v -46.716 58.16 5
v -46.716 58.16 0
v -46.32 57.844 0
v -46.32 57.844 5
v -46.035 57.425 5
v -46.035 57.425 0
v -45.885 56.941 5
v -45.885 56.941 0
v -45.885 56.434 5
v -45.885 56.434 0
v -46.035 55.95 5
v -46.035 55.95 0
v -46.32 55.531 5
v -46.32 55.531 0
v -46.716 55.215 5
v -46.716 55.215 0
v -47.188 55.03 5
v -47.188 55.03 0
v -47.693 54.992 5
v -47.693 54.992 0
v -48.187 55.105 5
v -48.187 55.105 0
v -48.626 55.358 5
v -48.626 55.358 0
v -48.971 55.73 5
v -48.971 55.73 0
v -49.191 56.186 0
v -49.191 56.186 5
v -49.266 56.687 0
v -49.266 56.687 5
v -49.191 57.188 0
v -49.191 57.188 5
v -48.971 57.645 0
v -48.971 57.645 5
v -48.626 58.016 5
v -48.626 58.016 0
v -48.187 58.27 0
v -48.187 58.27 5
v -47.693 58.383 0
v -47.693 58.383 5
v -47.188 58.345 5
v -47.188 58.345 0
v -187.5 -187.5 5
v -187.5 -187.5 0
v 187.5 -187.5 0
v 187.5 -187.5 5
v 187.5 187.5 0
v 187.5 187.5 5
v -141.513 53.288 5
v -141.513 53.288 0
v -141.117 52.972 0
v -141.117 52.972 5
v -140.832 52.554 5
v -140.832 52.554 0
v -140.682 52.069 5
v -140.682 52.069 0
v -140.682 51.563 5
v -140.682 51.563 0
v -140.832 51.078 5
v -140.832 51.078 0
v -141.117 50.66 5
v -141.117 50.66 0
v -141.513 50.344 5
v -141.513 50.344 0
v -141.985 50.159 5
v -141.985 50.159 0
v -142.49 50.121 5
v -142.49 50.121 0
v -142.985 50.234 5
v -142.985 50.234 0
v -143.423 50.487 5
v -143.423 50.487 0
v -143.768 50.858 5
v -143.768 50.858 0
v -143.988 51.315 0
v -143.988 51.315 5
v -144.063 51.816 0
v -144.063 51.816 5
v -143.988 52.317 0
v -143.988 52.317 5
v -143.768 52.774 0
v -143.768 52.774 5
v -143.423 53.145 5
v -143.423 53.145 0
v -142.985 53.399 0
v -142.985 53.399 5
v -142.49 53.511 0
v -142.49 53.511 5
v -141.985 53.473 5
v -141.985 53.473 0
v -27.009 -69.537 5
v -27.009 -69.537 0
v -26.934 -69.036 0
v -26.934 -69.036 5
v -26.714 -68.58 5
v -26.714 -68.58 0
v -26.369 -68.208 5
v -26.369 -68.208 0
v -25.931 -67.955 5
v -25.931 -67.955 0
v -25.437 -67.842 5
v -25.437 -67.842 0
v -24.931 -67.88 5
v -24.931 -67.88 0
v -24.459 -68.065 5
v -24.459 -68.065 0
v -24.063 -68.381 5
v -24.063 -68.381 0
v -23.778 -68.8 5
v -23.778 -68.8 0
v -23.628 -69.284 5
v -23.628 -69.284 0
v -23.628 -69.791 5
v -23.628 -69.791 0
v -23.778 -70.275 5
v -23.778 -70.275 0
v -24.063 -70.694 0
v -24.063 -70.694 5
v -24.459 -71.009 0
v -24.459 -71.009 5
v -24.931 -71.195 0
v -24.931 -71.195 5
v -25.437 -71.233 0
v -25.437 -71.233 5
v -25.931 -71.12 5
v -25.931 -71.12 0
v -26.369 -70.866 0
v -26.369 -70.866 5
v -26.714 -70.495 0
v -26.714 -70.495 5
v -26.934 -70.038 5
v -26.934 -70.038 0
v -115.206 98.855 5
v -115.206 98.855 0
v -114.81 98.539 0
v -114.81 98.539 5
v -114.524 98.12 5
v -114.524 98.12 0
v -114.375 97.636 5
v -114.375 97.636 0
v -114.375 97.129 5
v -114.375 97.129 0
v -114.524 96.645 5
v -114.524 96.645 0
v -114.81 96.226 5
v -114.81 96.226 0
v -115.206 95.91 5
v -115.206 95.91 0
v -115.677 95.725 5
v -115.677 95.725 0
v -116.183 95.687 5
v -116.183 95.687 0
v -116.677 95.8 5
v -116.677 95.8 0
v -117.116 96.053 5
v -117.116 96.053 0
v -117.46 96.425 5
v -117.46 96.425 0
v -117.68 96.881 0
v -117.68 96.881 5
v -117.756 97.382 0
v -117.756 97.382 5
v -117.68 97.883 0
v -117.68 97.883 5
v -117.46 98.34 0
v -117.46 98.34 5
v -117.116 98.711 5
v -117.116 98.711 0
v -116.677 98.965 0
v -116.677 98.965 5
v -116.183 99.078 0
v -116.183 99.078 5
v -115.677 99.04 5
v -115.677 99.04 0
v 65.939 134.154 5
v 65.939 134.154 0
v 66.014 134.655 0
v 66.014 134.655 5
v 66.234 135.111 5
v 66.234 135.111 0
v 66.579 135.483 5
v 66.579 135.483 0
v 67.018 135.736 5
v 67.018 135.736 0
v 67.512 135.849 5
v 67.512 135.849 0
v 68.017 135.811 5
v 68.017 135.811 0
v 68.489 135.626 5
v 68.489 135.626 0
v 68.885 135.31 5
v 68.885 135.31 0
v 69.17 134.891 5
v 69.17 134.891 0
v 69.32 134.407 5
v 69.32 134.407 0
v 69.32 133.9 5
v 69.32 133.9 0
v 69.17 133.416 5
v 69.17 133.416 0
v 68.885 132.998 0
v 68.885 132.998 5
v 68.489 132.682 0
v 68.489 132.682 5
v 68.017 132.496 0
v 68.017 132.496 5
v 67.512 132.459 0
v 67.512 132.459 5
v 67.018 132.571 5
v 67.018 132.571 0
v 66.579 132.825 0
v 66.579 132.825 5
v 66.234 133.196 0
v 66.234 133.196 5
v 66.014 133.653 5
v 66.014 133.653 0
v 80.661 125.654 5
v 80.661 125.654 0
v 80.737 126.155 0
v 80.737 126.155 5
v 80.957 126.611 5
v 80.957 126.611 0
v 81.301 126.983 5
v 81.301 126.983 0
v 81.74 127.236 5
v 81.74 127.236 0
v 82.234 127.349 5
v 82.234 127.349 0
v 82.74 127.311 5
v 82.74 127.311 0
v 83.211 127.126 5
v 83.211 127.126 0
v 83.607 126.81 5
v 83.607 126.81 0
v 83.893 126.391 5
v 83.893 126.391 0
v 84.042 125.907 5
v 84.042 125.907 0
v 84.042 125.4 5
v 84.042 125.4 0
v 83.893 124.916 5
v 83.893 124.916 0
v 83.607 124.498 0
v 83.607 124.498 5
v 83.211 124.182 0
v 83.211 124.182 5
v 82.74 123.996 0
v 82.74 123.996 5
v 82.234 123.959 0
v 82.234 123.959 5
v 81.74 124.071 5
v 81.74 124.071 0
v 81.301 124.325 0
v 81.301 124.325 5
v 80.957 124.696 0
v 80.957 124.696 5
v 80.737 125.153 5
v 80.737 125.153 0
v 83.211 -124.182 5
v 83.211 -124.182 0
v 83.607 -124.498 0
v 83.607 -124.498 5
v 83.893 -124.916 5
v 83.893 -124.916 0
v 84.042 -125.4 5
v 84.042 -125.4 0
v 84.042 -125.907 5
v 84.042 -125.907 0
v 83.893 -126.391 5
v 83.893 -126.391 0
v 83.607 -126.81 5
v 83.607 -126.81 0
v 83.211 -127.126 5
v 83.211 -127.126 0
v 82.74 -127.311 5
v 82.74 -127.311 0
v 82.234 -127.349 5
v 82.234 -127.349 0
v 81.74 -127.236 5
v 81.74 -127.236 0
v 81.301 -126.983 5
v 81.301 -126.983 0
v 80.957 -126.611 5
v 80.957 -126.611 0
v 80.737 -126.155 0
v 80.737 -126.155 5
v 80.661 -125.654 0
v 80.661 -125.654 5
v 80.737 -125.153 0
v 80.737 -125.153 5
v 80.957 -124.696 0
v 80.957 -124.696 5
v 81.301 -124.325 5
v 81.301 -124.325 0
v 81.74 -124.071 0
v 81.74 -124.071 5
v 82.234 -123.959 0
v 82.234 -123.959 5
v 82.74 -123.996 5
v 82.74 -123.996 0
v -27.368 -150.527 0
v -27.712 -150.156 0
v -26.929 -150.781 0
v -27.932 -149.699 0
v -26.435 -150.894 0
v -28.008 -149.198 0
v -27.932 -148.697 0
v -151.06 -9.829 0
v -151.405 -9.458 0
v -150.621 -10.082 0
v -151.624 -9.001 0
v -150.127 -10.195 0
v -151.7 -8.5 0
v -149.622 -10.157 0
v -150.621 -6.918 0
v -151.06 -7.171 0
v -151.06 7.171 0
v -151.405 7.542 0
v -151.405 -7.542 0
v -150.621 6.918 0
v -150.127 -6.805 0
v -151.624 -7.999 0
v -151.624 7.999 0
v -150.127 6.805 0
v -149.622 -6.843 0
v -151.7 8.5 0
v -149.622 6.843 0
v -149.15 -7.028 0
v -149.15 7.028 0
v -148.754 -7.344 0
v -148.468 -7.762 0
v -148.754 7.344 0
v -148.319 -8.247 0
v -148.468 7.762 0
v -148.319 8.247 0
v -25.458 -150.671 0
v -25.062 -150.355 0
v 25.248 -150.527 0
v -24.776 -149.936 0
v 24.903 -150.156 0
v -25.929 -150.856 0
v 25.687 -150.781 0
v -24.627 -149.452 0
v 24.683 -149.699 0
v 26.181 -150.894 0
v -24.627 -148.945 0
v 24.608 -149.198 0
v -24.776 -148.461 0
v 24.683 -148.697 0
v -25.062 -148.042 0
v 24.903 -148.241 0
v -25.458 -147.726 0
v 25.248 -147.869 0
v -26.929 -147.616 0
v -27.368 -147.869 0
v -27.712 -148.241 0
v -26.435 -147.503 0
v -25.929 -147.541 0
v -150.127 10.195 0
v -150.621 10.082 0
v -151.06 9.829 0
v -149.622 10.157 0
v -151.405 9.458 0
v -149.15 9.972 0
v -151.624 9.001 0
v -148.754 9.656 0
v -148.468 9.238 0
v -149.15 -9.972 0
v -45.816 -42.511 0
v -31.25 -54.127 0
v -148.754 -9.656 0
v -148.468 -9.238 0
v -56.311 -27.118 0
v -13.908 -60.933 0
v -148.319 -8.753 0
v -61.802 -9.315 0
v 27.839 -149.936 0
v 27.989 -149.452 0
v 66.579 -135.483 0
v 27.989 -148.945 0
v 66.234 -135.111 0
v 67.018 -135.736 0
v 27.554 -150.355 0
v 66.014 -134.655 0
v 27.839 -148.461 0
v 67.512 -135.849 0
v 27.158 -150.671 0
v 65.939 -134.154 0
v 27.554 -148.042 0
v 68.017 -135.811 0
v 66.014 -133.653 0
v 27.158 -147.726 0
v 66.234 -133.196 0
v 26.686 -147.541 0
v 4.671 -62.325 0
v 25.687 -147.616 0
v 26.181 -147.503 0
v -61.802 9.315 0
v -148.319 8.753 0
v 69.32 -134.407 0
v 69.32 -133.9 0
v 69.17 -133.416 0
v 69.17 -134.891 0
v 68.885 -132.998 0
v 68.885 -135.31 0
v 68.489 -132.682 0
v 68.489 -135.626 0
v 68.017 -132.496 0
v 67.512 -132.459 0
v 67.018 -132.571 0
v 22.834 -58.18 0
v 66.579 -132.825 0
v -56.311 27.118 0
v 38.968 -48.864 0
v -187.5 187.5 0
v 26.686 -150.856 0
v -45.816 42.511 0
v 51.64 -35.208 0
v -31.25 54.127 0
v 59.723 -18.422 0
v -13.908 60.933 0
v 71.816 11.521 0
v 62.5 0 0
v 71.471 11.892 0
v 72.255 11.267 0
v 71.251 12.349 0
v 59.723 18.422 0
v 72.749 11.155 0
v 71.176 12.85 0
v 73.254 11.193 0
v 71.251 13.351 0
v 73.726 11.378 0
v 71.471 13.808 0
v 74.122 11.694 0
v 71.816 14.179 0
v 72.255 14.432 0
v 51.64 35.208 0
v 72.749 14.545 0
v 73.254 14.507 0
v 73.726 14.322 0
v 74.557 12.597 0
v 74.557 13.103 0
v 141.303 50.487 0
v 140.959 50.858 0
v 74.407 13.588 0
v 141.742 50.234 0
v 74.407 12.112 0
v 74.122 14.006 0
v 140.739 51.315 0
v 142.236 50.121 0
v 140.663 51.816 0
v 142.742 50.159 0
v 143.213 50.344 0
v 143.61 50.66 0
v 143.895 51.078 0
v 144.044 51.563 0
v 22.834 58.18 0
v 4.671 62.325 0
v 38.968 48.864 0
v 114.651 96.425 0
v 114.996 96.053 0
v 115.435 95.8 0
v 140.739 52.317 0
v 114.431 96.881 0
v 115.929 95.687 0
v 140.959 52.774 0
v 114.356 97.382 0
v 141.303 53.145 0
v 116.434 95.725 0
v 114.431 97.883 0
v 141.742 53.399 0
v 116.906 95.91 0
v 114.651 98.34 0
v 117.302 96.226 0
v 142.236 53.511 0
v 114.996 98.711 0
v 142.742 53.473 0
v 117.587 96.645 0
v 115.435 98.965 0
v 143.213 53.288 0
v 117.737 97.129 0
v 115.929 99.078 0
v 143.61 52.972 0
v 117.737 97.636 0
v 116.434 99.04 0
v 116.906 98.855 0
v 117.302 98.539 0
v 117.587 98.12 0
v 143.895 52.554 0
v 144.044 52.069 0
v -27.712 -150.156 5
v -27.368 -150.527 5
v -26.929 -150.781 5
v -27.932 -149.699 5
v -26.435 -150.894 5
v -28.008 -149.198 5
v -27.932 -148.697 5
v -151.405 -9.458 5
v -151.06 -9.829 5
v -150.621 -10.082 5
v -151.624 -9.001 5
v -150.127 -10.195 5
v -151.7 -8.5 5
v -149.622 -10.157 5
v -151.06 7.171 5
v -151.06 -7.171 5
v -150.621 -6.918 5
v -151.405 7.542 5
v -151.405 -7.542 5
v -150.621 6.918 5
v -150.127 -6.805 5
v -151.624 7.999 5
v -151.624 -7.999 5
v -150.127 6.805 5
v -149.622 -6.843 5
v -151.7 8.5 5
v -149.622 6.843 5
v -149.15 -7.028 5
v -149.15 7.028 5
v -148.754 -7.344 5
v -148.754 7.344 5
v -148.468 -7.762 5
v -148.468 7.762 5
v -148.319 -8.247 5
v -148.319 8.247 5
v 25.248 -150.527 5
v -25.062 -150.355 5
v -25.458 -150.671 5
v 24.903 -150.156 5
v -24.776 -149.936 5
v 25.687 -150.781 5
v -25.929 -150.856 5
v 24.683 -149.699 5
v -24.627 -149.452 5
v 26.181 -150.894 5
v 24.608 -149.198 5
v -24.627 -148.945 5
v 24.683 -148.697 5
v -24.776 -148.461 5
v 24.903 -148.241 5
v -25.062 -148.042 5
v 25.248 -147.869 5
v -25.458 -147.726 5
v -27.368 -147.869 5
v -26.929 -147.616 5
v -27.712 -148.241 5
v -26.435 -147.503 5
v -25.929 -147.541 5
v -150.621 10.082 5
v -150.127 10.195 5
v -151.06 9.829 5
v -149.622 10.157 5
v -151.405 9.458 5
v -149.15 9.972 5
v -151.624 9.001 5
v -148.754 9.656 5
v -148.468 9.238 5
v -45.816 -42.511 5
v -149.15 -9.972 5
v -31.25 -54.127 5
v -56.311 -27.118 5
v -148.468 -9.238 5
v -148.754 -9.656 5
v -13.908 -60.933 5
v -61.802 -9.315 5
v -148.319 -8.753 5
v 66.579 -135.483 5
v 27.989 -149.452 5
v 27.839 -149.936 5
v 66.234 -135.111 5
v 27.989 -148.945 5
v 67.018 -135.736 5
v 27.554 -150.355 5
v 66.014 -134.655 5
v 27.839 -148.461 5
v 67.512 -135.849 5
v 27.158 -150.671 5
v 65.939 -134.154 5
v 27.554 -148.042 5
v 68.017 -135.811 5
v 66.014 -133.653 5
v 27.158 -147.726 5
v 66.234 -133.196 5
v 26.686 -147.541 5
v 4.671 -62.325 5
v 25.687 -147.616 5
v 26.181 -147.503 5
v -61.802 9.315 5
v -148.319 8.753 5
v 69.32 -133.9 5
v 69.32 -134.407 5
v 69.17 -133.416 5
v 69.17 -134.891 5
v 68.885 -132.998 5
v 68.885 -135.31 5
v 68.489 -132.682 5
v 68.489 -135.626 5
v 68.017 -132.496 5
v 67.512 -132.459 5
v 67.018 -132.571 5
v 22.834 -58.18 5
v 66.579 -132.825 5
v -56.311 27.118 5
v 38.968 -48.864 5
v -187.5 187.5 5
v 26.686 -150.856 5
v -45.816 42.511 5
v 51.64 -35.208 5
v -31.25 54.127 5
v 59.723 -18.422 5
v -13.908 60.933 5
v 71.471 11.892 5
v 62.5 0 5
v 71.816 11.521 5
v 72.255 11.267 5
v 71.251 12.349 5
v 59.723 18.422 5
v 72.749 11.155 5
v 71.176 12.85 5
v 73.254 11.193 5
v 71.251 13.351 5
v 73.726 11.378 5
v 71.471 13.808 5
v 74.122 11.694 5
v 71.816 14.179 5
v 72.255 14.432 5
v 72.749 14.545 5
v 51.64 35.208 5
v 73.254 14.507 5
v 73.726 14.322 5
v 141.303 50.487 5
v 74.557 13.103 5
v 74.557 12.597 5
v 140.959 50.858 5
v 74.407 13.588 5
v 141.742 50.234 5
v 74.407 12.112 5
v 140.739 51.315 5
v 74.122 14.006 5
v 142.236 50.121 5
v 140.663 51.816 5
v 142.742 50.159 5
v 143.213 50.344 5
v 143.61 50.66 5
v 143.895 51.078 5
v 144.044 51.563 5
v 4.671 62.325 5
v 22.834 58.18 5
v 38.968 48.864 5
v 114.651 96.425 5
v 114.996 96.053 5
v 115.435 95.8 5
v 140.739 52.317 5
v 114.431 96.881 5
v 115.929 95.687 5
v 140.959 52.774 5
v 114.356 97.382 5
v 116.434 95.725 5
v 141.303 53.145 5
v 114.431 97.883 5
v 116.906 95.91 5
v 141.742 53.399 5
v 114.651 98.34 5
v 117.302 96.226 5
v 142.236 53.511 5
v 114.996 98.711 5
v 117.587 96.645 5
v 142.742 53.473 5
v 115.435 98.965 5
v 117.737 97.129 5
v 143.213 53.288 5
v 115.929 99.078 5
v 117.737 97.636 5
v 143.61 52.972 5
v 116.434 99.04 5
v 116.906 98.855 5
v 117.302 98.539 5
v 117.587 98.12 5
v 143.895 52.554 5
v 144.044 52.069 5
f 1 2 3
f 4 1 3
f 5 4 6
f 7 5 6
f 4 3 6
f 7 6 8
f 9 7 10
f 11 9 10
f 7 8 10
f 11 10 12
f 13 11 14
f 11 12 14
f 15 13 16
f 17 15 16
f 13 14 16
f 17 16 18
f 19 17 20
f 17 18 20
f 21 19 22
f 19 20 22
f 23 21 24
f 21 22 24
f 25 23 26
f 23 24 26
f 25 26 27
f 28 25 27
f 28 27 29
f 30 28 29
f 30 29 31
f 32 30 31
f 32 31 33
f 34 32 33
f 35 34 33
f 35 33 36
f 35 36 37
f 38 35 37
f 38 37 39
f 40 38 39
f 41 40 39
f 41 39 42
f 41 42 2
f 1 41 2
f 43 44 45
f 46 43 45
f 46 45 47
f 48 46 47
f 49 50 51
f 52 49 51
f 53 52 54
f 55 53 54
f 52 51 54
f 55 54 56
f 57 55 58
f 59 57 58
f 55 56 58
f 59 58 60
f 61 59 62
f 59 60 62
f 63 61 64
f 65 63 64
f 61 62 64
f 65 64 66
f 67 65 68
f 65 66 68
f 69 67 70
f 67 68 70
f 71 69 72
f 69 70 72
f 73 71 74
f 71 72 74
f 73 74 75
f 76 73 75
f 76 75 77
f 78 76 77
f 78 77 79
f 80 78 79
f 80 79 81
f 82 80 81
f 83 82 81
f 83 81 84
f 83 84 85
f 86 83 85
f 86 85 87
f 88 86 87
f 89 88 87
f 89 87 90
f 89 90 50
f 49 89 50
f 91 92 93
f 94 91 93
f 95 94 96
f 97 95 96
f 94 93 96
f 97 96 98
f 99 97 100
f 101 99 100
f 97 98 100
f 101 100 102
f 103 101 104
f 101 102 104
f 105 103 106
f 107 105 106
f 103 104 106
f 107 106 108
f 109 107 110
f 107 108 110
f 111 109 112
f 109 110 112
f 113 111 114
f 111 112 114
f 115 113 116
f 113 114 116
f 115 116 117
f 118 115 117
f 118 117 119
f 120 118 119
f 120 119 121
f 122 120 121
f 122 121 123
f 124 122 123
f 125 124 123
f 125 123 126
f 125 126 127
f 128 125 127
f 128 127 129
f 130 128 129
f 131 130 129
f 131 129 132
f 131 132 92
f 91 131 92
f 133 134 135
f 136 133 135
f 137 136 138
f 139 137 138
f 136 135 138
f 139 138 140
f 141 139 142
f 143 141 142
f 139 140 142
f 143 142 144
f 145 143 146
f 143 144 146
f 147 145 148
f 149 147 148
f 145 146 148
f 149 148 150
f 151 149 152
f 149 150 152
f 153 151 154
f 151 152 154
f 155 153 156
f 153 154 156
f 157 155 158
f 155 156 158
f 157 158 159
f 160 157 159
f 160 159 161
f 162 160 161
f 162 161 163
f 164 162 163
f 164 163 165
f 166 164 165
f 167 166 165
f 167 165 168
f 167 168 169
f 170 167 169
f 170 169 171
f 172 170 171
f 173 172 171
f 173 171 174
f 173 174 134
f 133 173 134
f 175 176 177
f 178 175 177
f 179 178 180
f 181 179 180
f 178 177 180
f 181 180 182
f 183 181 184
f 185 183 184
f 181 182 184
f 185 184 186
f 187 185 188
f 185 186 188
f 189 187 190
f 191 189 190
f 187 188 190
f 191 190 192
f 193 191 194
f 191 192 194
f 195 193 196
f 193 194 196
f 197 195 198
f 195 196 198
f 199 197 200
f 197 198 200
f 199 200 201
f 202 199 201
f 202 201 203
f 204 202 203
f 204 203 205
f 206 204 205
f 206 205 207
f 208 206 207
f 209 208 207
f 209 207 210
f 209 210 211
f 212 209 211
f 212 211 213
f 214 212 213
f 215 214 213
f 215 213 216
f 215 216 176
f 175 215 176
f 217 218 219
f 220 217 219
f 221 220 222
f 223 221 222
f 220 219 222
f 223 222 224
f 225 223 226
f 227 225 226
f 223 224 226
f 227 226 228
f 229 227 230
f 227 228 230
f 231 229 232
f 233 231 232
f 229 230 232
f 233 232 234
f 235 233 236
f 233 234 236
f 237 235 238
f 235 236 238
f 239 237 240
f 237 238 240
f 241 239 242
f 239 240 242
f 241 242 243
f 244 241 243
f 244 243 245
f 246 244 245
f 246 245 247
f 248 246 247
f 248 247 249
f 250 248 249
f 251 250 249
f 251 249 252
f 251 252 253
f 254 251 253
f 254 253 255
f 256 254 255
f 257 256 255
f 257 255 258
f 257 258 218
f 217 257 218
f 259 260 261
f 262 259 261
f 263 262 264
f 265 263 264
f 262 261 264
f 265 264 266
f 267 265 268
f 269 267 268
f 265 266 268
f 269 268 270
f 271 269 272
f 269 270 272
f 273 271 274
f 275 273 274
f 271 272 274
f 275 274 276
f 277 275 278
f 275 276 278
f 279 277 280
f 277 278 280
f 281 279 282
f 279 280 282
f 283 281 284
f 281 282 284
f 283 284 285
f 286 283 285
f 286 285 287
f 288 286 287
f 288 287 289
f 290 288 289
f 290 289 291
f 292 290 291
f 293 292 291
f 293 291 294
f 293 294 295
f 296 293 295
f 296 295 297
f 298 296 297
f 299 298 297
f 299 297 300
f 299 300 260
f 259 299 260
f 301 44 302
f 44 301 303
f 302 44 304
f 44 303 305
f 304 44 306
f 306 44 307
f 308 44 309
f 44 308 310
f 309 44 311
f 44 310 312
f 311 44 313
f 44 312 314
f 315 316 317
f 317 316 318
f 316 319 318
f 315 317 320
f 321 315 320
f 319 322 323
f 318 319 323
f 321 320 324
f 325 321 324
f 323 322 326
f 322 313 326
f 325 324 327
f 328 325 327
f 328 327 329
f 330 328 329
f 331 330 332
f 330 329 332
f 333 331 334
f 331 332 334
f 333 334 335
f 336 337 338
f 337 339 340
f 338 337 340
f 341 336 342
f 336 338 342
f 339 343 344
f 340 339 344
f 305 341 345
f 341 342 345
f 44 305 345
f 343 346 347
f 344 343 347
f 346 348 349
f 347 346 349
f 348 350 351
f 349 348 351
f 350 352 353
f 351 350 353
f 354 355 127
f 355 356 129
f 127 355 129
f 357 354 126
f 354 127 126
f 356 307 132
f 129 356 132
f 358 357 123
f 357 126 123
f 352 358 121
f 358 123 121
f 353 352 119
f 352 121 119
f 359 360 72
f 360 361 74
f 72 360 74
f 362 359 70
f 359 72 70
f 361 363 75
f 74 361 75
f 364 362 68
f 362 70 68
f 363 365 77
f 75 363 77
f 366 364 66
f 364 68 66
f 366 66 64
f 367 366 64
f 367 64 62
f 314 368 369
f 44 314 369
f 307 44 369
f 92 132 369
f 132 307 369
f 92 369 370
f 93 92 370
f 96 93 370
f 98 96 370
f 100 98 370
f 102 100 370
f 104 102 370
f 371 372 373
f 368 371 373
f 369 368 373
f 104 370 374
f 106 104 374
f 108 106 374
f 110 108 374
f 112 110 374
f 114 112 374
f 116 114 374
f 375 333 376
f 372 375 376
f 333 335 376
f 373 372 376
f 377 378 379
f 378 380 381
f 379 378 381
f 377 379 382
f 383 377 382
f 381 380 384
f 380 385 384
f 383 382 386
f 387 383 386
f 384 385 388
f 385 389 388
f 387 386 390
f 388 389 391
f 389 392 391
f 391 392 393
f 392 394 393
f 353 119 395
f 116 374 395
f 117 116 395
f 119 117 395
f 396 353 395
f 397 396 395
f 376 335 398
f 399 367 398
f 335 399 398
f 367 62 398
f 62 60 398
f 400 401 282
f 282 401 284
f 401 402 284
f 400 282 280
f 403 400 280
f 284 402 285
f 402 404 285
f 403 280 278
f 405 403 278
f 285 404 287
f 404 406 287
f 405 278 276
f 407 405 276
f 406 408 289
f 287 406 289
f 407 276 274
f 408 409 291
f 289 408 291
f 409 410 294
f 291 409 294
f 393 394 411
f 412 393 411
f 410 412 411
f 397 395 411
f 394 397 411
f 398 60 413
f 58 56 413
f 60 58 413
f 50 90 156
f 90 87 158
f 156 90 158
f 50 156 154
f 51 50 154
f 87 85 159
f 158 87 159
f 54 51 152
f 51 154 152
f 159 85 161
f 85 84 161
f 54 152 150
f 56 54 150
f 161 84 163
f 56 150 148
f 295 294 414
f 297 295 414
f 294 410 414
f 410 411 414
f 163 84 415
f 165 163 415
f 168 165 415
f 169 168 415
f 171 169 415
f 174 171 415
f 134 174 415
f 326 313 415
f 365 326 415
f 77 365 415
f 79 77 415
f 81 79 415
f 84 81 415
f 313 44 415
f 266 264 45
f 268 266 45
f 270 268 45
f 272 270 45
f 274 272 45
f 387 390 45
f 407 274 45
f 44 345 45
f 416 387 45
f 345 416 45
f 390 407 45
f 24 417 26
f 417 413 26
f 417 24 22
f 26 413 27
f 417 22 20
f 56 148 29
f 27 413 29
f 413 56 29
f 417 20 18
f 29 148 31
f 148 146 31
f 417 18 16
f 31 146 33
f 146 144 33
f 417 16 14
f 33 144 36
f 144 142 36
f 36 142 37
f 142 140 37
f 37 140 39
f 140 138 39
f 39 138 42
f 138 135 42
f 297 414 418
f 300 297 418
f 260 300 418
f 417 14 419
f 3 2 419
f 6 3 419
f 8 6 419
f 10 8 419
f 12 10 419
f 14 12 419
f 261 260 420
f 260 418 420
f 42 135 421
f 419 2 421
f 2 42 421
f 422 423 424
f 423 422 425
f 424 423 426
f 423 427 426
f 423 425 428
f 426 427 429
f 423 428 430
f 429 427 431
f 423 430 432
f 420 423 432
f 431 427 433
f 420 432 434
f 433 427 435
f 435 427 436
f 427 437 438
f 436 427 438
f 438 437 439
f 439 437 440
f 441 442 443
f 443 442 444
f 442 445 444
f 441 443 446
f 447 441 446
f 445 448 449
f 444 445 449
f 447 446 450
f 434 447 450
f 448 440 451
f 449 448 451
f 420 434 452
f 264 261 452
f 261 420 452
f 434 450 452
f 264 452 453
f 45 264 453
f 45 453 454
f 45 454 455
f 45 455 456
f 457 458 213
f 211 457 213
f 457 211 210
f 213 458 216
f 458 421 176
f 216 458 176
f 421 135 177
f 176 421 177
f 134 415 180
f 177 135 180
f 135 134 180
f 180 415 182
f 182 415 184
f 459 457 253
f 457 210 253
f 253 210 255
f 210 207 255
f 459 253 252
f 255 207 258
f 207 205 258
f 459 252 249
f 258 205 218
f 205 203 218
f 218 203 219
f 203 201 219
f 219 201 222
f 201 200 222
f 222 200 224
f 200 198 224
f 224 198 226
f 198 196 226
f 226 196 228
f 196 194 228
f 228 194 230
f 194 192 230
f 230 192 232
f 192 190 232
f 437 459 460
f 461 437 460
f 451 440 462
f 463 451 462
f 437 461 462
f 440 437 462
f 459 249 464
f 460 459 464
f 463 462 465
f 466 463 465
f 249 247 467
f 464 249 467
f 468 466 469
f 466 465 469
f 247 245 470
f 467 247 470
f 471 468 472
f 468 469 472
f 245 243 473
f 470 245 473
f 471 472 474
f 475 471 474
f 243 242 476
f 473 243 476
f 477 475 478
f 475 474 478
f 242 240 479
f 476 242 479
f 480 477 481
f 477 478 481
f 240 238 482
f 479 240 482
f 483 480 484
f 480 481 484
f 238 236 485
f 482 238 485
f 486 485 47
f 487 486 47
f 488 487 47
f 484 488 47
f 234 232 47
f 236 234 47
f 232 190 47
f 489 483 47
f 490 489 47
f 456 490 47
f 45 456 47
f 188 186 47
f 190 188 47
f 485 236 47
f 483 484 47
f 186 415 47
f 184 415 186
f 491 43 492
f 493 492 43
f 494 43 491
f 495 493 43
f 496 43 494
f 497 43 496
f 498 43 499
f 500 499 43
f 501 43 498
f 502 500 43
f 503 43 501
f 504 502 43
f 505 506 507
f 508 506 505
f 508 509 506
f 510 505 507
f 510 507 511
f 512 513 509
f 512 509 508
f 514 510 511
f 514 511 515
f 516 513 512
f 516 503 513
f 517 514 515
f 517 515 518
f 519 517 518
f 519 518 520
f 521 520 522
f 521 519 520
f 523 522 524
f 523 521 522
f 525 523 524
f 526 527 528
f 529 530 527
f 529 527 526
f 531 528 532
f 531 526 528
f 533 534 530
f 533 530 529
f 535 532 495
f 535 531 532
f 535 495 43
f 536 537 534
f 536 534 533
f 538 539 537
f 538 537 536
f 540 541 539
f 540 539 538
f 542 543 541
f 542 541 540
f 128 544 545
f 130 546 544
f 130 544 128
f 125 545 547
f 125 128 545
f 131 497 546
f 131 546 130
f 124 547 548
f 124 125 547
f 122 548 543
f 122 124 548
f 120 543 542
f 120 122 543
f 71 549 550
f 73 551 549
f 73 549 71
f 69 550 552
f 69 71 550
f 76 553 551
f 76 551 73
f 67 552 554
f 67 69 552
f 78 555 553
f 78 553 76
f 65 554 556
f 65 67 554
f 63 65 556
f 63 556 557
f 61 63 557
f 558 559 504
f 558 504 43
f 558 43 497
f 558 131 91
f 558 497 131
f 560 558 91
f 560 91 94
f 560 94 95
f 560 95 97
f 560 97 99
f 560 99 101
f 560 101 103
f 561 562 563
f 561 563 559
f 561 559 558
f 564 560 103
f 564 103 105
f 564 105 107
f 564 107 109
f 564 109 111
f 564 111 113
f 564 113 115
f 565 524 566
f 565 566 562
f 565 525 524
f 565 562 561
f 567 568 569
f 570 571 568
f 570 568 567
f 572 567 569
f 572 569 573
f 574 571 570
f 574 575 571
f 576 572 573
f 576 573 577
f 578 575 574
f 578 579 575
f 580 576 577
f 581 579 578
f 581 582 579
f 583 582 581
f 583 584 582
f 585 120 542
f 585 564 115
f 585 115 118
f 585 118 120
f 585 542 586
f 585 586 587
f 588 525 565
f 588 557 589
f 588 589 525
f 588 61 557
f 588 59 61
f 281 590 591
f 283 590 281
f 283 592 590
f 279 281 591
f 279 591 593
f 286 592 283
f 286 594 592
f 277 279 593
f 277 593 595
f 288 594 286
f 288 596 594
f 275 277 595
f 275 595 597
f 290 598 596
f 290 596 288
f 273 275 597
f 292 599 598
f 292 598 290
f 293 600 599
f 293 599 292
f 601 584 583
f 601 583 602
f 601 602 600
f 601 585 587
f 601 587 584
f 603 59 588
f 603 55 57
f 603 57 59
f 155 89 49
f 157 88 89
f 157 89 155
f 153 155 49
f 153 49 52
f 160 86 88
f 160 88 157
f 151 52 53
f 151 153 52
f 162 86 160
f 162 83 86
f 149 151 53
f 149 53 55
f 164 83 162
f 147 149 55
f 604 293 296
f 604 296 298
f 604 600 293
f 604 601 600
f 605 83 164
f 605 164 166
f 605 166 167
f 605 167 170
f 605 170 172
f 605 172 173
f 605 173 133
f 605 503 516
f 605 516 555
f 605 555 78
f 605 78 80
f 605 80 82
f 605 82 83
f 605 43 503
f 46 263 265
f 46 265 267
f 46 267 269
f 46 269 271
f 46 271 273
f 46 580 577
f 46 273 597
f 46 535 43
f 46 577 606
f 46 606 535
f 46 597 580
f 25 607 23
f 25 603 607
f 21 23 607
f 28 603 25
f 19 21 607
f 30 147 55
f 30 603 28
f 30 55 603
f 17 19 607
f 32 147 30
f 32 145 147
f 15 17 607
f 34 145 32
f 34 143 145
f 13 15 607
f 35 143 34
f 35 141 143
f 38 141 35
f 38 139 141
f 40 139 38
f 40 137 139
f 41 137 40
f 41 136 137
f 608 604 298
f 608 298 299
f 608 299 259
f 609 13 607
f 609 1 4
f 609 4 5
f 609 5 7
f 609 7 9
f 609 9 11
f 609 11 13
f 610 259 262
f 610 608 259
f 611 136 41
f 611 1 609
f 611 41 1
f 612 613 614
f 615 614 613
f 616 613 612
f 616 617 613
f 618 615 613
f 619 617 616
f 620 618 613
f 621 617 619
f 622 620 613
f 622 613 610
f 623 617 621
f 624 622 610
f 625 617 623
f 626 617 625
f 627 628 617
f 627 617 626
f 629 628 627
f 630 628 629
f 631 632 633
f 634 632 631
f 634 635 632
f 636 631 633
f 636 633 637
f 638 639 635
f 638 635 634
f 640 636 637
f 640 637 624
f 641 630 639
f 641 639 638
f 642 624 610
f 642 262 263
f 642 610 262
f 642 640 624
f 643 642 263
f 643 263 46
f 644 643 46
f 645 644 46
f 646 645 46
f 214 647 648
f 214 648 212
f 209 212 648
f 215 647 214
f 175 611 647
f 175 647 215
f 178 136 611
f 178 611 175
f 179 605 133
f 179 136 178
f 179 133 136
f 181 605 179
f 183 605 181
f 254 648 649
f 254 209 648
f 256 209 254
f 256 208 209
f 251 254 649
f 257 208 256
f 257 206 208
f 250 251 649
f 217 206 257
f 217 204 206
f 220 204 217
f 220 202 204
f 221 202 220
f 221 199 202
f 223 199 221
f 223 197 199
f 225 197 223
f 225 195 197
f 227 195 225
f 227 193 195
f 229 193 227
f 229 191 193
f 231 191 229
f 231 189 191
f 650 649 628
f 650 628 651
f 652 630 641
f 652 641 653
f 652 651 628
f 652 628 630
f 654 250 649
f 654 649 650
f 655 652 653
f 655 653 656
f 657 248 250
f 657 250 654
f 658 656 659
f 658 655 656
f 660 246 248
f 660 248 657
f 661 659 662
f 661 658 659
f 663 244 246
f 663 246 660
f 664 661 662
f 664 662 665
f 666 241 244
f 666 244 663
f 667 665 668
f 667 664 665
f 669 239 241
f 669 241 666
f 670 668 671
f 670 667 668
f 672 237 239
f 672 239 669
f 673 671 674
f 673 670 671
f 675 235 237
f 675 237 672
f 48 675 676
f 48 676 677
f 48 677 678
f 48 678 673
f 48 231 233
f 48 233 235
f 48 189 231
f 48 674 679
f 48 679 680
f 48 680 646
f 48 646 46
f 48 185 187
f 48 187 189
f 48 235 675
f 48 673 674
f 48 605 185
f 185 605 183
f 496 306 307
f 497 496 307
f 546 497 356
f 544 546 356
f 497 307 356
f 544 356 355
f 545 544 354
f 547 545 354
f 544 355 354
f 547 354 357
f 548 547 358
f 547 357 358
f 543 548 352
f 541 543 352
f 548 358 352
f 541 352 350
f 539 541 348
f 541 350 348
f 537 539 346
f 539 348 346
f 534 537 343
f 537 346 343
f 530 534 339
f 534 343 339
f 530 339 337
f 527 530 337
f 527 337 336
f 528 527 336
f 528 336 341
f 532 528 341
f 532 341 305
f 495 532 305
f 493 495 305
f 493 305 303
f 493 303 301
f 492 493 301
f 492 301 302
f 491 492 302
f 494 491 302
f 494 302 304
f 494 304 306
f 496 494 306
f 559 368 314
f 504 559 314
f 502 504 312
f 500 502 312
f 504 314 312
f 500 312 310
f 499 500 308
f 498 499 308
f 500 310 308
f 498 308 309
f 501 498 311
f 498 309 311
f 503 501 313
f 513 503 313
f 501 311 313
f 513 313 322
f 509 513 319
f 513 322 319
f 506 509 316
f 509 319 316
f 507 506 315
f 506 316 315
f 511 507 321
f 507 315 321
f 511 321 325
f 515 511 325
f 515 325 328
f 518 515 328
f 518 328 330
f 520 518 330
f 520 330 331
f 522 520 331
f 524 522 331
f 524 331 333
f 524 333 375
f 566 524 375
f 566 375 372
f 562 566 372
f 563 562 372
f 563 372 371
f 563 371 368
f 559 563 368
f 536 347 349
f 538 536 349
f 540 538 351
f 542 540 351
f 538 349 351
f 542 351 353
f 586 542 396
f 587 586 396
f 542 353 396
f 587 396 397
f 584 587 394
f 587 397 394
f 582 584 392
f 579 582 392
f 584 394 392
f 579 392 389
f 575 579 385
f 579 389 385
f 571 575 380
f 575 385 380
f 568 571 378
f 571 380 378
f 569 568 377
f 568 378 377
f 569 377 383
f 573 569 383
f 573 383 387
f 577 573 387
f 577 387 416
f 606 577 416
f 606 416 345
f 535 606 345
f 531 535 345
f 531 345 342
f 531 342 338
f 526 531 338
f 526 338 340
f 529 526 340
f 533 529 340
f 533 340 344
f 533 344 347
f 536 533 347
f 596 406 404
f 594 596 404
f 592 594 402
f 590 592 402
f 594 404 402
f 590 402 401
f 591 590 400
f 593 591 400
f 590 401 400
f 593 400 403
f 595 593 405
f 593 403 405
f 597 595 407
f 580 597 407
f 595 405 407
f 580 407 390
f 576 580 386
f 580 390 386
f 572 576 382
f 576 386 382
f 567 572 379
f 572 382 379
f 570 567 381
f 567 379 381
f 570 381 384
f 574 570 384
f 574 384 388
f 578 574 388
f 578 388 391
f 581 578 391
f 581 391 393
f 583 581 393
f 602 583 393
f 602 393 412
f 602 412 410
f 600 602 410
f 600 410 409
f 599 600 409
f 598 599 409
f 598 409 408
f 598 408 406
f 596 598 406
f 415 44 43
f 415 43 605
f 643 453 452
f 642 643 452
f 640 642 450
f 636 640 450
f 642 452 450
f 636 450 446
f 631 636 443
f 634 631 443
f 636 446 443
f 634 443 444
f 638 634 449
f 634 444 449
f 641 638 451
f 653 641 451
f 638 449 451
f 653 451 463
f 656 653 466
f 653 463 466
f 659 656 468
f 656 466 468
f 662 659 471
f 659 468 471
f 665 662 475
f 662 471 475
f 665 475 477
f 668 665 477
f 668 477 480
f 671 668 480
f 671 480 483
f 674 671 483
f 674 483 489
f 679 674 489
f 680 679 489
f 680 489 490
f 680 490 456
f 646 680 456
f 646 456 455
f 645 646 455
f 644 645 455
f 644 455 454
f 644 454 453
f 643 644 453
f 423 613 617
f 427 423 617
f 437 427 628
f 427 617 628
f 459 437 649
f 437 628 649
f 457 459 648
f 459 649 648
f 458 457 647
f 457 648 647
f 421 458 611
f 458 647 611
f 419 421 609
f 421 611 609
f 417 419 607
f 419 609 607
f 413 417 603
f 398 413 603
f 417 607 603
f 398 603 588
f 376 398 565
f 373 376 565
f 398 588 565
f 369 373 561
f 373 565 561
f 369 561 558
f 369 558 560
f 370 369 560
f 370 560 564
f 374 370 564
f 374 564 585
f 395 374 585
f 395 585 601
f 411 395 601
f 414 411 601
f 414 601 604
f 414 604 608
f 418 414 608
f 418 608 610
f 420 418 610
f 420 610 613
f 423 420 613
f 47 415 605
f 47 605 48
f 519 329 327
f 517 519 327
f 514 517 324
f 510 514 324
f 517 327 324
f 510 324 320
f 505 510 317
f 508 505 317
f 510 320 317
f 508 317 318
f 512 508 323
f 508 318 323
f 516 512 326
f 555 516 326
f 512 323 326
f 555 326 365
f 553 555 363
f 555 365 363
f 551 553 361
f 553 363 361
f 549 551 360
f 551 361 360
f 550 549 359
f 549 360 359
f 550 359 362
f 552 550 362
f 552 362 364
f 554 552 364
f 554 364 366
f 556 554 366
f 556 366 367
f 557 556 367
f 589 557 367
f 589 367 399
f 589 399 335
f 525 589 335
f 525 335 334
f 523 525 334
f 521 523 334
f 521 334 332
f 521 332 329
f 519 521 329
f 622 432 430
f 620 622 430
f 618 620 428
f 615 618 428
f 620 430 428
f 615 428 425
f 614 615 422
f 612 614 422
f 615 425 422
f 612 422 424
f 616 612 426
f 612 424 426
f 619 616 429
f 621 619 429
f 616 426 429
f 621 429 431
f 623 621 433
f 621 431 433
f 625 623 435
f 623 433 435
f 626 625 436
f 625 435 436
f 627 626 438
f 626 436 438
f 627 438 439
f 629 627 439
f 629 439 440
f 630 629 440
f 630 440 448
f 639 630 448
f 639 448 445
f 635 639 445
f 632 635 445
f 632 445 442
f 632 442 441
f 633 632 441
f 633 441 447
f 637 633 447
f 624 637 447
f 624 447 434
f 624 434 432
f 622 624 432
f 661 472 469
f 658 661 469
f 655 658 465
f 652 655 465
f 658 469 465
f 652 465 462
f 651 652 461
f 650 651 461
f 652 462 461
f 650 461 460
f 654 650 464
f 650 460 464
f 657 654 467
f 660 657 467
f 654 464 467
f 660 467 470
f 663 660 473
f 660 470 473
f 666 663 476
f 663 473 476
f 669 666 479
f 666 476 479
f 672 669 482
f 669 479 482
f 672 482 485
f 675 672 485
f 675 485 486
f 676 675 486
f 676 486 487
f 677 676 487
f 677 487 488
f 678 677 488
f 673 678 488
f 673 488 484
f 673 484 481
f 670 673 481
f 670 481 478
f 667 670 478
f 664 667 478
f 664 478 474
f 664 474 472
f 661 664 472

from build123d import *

# Parameters (mm, degrees)
SCHIZZO1_W                   = 375
SCHIZZO1_H                   = 375
ESTRUSIONE_ESTRUSIONE1_DEPTH = 5
TAGLIO_ESTRUSIONE1_REACH     = 267.212
SCHIZZO2_R                   = 62.5
FORO_PER_VITE_M3_4_D         = 3.4
RIPETIZIONECIRCOLARE1_COUNT  = 3
FORO_PER_VITE_M3_2_D         = 3.4
RIPETIZIONECIRCOLARE3_COUNT  = 3
FORO_PER_VITE_M3_5_D         = 3.4
RIPETIZIONECIRCOLARE4_COUNT  = 3


with BuildPart() as part:
    # Schizzo1 → Estrusione-Estrusione1 (new body)
    with BuildSketch(Plane.XY):
        Rectangle(SCHIZZO1_W, SCHIZZO1_H)
    extrude(amount=ESTRUSIONE_ESTRUSIONE1_DEPTH)

    # Schizzo2 → Taglio-Estrusione1 (cut, up to next)
    with BuildSketch(Plane.XY.offset(5), mode=Mode.PRIVATE) as taglio_estrusione1_sk1:
        Circle(SCHIZZO2_R)
    taglio_estrusione1_tool1 = extrude(taglio_estrusione1_sk1.sketch, amount=-TAGLIO_ESTRUSIONE1_REACH, mode=Mode.PRIVATE) & part.part
    add(taglio_estrusione1_tool1.solids().sort_by_distance((0, 0, 5))[0], mode=Mode.SUBTRACT)

    # Foro per Vite M3-4 (through all)
    with Locations(Plane.XY.offset(5)):
        with Locations((-26.307698917, -149.198374581), (26.307698917, -149.198374581)):
            foro_per_vite_m3_4 = Hole(FORO_PER_VITE_M3_4_D / 2)

    # RipetizioneCircolare1: Foro per Vite M3-4 ×3 about axis
    ripetizionecircolare1_axis = Axis((0, 0, 0), (0, 0, 1))
    for i in range(1, RIPETIZIONECIRCOLARE1_COUNT):
        add(foro_per_vite_m3_4.rotate(ripetizionecircolare1_axis, i * 360 / RIPETIZIONECIRCOLARE1_COUNT), mode=Mode.SUBTRACT)

    # Foro per Vite M3-2 (through all)
    with Locations(Plane.XY.offset(5)):
        with Locations((-25.309490606, -69.537253938)):
            foro_per_vite_m3_2 = Hole(FORO_PER_VITE_M3_2_D / 2)

    # RipetizioneCircolare3: Foro per Vite M3-2 ×3 about axis
    ripetizionecircolare3_axis = Axis((0, 0, 0), (0, 0, 1))
    for i in range(1, RIPETIZIONECIRCOLARE3_COUNT):
        add(foro_per_vite_m3_2.rotate(ripetizionecircolare3_axis, i * 360 / RIPETIZIONECIRCOLARE3_COUNT), mode=Mode.SUBTRACT)

    # Foro per Vite M3-5 (through all)
    with Locations(Plane.XY.offset(5)):
        with Locations((67.638784068, 134.153810568), (82.361215932, 125.653810568)):
            foro_per_vite_m3_5 = Hole(FORO_PER_VITE_M3_5_D / 2)

    # RipetizioneCircolare4: Foro per Vite M3-5 ×3 about axis
    ripetizionecircolare4_axis = Axis((0, 0, 0), (0, 0, 1))
    for i in range(1, RIPETIZIONECIRCOLARE4_COUNT):
        add(foro_per_vite_m3_5.rotate(ripetizionecircolare4_axis, i * 360 / RIPETIZIONECIRCOLARE4_COUNT), mode=Mode.SUBTRACT)


solid = part.part
